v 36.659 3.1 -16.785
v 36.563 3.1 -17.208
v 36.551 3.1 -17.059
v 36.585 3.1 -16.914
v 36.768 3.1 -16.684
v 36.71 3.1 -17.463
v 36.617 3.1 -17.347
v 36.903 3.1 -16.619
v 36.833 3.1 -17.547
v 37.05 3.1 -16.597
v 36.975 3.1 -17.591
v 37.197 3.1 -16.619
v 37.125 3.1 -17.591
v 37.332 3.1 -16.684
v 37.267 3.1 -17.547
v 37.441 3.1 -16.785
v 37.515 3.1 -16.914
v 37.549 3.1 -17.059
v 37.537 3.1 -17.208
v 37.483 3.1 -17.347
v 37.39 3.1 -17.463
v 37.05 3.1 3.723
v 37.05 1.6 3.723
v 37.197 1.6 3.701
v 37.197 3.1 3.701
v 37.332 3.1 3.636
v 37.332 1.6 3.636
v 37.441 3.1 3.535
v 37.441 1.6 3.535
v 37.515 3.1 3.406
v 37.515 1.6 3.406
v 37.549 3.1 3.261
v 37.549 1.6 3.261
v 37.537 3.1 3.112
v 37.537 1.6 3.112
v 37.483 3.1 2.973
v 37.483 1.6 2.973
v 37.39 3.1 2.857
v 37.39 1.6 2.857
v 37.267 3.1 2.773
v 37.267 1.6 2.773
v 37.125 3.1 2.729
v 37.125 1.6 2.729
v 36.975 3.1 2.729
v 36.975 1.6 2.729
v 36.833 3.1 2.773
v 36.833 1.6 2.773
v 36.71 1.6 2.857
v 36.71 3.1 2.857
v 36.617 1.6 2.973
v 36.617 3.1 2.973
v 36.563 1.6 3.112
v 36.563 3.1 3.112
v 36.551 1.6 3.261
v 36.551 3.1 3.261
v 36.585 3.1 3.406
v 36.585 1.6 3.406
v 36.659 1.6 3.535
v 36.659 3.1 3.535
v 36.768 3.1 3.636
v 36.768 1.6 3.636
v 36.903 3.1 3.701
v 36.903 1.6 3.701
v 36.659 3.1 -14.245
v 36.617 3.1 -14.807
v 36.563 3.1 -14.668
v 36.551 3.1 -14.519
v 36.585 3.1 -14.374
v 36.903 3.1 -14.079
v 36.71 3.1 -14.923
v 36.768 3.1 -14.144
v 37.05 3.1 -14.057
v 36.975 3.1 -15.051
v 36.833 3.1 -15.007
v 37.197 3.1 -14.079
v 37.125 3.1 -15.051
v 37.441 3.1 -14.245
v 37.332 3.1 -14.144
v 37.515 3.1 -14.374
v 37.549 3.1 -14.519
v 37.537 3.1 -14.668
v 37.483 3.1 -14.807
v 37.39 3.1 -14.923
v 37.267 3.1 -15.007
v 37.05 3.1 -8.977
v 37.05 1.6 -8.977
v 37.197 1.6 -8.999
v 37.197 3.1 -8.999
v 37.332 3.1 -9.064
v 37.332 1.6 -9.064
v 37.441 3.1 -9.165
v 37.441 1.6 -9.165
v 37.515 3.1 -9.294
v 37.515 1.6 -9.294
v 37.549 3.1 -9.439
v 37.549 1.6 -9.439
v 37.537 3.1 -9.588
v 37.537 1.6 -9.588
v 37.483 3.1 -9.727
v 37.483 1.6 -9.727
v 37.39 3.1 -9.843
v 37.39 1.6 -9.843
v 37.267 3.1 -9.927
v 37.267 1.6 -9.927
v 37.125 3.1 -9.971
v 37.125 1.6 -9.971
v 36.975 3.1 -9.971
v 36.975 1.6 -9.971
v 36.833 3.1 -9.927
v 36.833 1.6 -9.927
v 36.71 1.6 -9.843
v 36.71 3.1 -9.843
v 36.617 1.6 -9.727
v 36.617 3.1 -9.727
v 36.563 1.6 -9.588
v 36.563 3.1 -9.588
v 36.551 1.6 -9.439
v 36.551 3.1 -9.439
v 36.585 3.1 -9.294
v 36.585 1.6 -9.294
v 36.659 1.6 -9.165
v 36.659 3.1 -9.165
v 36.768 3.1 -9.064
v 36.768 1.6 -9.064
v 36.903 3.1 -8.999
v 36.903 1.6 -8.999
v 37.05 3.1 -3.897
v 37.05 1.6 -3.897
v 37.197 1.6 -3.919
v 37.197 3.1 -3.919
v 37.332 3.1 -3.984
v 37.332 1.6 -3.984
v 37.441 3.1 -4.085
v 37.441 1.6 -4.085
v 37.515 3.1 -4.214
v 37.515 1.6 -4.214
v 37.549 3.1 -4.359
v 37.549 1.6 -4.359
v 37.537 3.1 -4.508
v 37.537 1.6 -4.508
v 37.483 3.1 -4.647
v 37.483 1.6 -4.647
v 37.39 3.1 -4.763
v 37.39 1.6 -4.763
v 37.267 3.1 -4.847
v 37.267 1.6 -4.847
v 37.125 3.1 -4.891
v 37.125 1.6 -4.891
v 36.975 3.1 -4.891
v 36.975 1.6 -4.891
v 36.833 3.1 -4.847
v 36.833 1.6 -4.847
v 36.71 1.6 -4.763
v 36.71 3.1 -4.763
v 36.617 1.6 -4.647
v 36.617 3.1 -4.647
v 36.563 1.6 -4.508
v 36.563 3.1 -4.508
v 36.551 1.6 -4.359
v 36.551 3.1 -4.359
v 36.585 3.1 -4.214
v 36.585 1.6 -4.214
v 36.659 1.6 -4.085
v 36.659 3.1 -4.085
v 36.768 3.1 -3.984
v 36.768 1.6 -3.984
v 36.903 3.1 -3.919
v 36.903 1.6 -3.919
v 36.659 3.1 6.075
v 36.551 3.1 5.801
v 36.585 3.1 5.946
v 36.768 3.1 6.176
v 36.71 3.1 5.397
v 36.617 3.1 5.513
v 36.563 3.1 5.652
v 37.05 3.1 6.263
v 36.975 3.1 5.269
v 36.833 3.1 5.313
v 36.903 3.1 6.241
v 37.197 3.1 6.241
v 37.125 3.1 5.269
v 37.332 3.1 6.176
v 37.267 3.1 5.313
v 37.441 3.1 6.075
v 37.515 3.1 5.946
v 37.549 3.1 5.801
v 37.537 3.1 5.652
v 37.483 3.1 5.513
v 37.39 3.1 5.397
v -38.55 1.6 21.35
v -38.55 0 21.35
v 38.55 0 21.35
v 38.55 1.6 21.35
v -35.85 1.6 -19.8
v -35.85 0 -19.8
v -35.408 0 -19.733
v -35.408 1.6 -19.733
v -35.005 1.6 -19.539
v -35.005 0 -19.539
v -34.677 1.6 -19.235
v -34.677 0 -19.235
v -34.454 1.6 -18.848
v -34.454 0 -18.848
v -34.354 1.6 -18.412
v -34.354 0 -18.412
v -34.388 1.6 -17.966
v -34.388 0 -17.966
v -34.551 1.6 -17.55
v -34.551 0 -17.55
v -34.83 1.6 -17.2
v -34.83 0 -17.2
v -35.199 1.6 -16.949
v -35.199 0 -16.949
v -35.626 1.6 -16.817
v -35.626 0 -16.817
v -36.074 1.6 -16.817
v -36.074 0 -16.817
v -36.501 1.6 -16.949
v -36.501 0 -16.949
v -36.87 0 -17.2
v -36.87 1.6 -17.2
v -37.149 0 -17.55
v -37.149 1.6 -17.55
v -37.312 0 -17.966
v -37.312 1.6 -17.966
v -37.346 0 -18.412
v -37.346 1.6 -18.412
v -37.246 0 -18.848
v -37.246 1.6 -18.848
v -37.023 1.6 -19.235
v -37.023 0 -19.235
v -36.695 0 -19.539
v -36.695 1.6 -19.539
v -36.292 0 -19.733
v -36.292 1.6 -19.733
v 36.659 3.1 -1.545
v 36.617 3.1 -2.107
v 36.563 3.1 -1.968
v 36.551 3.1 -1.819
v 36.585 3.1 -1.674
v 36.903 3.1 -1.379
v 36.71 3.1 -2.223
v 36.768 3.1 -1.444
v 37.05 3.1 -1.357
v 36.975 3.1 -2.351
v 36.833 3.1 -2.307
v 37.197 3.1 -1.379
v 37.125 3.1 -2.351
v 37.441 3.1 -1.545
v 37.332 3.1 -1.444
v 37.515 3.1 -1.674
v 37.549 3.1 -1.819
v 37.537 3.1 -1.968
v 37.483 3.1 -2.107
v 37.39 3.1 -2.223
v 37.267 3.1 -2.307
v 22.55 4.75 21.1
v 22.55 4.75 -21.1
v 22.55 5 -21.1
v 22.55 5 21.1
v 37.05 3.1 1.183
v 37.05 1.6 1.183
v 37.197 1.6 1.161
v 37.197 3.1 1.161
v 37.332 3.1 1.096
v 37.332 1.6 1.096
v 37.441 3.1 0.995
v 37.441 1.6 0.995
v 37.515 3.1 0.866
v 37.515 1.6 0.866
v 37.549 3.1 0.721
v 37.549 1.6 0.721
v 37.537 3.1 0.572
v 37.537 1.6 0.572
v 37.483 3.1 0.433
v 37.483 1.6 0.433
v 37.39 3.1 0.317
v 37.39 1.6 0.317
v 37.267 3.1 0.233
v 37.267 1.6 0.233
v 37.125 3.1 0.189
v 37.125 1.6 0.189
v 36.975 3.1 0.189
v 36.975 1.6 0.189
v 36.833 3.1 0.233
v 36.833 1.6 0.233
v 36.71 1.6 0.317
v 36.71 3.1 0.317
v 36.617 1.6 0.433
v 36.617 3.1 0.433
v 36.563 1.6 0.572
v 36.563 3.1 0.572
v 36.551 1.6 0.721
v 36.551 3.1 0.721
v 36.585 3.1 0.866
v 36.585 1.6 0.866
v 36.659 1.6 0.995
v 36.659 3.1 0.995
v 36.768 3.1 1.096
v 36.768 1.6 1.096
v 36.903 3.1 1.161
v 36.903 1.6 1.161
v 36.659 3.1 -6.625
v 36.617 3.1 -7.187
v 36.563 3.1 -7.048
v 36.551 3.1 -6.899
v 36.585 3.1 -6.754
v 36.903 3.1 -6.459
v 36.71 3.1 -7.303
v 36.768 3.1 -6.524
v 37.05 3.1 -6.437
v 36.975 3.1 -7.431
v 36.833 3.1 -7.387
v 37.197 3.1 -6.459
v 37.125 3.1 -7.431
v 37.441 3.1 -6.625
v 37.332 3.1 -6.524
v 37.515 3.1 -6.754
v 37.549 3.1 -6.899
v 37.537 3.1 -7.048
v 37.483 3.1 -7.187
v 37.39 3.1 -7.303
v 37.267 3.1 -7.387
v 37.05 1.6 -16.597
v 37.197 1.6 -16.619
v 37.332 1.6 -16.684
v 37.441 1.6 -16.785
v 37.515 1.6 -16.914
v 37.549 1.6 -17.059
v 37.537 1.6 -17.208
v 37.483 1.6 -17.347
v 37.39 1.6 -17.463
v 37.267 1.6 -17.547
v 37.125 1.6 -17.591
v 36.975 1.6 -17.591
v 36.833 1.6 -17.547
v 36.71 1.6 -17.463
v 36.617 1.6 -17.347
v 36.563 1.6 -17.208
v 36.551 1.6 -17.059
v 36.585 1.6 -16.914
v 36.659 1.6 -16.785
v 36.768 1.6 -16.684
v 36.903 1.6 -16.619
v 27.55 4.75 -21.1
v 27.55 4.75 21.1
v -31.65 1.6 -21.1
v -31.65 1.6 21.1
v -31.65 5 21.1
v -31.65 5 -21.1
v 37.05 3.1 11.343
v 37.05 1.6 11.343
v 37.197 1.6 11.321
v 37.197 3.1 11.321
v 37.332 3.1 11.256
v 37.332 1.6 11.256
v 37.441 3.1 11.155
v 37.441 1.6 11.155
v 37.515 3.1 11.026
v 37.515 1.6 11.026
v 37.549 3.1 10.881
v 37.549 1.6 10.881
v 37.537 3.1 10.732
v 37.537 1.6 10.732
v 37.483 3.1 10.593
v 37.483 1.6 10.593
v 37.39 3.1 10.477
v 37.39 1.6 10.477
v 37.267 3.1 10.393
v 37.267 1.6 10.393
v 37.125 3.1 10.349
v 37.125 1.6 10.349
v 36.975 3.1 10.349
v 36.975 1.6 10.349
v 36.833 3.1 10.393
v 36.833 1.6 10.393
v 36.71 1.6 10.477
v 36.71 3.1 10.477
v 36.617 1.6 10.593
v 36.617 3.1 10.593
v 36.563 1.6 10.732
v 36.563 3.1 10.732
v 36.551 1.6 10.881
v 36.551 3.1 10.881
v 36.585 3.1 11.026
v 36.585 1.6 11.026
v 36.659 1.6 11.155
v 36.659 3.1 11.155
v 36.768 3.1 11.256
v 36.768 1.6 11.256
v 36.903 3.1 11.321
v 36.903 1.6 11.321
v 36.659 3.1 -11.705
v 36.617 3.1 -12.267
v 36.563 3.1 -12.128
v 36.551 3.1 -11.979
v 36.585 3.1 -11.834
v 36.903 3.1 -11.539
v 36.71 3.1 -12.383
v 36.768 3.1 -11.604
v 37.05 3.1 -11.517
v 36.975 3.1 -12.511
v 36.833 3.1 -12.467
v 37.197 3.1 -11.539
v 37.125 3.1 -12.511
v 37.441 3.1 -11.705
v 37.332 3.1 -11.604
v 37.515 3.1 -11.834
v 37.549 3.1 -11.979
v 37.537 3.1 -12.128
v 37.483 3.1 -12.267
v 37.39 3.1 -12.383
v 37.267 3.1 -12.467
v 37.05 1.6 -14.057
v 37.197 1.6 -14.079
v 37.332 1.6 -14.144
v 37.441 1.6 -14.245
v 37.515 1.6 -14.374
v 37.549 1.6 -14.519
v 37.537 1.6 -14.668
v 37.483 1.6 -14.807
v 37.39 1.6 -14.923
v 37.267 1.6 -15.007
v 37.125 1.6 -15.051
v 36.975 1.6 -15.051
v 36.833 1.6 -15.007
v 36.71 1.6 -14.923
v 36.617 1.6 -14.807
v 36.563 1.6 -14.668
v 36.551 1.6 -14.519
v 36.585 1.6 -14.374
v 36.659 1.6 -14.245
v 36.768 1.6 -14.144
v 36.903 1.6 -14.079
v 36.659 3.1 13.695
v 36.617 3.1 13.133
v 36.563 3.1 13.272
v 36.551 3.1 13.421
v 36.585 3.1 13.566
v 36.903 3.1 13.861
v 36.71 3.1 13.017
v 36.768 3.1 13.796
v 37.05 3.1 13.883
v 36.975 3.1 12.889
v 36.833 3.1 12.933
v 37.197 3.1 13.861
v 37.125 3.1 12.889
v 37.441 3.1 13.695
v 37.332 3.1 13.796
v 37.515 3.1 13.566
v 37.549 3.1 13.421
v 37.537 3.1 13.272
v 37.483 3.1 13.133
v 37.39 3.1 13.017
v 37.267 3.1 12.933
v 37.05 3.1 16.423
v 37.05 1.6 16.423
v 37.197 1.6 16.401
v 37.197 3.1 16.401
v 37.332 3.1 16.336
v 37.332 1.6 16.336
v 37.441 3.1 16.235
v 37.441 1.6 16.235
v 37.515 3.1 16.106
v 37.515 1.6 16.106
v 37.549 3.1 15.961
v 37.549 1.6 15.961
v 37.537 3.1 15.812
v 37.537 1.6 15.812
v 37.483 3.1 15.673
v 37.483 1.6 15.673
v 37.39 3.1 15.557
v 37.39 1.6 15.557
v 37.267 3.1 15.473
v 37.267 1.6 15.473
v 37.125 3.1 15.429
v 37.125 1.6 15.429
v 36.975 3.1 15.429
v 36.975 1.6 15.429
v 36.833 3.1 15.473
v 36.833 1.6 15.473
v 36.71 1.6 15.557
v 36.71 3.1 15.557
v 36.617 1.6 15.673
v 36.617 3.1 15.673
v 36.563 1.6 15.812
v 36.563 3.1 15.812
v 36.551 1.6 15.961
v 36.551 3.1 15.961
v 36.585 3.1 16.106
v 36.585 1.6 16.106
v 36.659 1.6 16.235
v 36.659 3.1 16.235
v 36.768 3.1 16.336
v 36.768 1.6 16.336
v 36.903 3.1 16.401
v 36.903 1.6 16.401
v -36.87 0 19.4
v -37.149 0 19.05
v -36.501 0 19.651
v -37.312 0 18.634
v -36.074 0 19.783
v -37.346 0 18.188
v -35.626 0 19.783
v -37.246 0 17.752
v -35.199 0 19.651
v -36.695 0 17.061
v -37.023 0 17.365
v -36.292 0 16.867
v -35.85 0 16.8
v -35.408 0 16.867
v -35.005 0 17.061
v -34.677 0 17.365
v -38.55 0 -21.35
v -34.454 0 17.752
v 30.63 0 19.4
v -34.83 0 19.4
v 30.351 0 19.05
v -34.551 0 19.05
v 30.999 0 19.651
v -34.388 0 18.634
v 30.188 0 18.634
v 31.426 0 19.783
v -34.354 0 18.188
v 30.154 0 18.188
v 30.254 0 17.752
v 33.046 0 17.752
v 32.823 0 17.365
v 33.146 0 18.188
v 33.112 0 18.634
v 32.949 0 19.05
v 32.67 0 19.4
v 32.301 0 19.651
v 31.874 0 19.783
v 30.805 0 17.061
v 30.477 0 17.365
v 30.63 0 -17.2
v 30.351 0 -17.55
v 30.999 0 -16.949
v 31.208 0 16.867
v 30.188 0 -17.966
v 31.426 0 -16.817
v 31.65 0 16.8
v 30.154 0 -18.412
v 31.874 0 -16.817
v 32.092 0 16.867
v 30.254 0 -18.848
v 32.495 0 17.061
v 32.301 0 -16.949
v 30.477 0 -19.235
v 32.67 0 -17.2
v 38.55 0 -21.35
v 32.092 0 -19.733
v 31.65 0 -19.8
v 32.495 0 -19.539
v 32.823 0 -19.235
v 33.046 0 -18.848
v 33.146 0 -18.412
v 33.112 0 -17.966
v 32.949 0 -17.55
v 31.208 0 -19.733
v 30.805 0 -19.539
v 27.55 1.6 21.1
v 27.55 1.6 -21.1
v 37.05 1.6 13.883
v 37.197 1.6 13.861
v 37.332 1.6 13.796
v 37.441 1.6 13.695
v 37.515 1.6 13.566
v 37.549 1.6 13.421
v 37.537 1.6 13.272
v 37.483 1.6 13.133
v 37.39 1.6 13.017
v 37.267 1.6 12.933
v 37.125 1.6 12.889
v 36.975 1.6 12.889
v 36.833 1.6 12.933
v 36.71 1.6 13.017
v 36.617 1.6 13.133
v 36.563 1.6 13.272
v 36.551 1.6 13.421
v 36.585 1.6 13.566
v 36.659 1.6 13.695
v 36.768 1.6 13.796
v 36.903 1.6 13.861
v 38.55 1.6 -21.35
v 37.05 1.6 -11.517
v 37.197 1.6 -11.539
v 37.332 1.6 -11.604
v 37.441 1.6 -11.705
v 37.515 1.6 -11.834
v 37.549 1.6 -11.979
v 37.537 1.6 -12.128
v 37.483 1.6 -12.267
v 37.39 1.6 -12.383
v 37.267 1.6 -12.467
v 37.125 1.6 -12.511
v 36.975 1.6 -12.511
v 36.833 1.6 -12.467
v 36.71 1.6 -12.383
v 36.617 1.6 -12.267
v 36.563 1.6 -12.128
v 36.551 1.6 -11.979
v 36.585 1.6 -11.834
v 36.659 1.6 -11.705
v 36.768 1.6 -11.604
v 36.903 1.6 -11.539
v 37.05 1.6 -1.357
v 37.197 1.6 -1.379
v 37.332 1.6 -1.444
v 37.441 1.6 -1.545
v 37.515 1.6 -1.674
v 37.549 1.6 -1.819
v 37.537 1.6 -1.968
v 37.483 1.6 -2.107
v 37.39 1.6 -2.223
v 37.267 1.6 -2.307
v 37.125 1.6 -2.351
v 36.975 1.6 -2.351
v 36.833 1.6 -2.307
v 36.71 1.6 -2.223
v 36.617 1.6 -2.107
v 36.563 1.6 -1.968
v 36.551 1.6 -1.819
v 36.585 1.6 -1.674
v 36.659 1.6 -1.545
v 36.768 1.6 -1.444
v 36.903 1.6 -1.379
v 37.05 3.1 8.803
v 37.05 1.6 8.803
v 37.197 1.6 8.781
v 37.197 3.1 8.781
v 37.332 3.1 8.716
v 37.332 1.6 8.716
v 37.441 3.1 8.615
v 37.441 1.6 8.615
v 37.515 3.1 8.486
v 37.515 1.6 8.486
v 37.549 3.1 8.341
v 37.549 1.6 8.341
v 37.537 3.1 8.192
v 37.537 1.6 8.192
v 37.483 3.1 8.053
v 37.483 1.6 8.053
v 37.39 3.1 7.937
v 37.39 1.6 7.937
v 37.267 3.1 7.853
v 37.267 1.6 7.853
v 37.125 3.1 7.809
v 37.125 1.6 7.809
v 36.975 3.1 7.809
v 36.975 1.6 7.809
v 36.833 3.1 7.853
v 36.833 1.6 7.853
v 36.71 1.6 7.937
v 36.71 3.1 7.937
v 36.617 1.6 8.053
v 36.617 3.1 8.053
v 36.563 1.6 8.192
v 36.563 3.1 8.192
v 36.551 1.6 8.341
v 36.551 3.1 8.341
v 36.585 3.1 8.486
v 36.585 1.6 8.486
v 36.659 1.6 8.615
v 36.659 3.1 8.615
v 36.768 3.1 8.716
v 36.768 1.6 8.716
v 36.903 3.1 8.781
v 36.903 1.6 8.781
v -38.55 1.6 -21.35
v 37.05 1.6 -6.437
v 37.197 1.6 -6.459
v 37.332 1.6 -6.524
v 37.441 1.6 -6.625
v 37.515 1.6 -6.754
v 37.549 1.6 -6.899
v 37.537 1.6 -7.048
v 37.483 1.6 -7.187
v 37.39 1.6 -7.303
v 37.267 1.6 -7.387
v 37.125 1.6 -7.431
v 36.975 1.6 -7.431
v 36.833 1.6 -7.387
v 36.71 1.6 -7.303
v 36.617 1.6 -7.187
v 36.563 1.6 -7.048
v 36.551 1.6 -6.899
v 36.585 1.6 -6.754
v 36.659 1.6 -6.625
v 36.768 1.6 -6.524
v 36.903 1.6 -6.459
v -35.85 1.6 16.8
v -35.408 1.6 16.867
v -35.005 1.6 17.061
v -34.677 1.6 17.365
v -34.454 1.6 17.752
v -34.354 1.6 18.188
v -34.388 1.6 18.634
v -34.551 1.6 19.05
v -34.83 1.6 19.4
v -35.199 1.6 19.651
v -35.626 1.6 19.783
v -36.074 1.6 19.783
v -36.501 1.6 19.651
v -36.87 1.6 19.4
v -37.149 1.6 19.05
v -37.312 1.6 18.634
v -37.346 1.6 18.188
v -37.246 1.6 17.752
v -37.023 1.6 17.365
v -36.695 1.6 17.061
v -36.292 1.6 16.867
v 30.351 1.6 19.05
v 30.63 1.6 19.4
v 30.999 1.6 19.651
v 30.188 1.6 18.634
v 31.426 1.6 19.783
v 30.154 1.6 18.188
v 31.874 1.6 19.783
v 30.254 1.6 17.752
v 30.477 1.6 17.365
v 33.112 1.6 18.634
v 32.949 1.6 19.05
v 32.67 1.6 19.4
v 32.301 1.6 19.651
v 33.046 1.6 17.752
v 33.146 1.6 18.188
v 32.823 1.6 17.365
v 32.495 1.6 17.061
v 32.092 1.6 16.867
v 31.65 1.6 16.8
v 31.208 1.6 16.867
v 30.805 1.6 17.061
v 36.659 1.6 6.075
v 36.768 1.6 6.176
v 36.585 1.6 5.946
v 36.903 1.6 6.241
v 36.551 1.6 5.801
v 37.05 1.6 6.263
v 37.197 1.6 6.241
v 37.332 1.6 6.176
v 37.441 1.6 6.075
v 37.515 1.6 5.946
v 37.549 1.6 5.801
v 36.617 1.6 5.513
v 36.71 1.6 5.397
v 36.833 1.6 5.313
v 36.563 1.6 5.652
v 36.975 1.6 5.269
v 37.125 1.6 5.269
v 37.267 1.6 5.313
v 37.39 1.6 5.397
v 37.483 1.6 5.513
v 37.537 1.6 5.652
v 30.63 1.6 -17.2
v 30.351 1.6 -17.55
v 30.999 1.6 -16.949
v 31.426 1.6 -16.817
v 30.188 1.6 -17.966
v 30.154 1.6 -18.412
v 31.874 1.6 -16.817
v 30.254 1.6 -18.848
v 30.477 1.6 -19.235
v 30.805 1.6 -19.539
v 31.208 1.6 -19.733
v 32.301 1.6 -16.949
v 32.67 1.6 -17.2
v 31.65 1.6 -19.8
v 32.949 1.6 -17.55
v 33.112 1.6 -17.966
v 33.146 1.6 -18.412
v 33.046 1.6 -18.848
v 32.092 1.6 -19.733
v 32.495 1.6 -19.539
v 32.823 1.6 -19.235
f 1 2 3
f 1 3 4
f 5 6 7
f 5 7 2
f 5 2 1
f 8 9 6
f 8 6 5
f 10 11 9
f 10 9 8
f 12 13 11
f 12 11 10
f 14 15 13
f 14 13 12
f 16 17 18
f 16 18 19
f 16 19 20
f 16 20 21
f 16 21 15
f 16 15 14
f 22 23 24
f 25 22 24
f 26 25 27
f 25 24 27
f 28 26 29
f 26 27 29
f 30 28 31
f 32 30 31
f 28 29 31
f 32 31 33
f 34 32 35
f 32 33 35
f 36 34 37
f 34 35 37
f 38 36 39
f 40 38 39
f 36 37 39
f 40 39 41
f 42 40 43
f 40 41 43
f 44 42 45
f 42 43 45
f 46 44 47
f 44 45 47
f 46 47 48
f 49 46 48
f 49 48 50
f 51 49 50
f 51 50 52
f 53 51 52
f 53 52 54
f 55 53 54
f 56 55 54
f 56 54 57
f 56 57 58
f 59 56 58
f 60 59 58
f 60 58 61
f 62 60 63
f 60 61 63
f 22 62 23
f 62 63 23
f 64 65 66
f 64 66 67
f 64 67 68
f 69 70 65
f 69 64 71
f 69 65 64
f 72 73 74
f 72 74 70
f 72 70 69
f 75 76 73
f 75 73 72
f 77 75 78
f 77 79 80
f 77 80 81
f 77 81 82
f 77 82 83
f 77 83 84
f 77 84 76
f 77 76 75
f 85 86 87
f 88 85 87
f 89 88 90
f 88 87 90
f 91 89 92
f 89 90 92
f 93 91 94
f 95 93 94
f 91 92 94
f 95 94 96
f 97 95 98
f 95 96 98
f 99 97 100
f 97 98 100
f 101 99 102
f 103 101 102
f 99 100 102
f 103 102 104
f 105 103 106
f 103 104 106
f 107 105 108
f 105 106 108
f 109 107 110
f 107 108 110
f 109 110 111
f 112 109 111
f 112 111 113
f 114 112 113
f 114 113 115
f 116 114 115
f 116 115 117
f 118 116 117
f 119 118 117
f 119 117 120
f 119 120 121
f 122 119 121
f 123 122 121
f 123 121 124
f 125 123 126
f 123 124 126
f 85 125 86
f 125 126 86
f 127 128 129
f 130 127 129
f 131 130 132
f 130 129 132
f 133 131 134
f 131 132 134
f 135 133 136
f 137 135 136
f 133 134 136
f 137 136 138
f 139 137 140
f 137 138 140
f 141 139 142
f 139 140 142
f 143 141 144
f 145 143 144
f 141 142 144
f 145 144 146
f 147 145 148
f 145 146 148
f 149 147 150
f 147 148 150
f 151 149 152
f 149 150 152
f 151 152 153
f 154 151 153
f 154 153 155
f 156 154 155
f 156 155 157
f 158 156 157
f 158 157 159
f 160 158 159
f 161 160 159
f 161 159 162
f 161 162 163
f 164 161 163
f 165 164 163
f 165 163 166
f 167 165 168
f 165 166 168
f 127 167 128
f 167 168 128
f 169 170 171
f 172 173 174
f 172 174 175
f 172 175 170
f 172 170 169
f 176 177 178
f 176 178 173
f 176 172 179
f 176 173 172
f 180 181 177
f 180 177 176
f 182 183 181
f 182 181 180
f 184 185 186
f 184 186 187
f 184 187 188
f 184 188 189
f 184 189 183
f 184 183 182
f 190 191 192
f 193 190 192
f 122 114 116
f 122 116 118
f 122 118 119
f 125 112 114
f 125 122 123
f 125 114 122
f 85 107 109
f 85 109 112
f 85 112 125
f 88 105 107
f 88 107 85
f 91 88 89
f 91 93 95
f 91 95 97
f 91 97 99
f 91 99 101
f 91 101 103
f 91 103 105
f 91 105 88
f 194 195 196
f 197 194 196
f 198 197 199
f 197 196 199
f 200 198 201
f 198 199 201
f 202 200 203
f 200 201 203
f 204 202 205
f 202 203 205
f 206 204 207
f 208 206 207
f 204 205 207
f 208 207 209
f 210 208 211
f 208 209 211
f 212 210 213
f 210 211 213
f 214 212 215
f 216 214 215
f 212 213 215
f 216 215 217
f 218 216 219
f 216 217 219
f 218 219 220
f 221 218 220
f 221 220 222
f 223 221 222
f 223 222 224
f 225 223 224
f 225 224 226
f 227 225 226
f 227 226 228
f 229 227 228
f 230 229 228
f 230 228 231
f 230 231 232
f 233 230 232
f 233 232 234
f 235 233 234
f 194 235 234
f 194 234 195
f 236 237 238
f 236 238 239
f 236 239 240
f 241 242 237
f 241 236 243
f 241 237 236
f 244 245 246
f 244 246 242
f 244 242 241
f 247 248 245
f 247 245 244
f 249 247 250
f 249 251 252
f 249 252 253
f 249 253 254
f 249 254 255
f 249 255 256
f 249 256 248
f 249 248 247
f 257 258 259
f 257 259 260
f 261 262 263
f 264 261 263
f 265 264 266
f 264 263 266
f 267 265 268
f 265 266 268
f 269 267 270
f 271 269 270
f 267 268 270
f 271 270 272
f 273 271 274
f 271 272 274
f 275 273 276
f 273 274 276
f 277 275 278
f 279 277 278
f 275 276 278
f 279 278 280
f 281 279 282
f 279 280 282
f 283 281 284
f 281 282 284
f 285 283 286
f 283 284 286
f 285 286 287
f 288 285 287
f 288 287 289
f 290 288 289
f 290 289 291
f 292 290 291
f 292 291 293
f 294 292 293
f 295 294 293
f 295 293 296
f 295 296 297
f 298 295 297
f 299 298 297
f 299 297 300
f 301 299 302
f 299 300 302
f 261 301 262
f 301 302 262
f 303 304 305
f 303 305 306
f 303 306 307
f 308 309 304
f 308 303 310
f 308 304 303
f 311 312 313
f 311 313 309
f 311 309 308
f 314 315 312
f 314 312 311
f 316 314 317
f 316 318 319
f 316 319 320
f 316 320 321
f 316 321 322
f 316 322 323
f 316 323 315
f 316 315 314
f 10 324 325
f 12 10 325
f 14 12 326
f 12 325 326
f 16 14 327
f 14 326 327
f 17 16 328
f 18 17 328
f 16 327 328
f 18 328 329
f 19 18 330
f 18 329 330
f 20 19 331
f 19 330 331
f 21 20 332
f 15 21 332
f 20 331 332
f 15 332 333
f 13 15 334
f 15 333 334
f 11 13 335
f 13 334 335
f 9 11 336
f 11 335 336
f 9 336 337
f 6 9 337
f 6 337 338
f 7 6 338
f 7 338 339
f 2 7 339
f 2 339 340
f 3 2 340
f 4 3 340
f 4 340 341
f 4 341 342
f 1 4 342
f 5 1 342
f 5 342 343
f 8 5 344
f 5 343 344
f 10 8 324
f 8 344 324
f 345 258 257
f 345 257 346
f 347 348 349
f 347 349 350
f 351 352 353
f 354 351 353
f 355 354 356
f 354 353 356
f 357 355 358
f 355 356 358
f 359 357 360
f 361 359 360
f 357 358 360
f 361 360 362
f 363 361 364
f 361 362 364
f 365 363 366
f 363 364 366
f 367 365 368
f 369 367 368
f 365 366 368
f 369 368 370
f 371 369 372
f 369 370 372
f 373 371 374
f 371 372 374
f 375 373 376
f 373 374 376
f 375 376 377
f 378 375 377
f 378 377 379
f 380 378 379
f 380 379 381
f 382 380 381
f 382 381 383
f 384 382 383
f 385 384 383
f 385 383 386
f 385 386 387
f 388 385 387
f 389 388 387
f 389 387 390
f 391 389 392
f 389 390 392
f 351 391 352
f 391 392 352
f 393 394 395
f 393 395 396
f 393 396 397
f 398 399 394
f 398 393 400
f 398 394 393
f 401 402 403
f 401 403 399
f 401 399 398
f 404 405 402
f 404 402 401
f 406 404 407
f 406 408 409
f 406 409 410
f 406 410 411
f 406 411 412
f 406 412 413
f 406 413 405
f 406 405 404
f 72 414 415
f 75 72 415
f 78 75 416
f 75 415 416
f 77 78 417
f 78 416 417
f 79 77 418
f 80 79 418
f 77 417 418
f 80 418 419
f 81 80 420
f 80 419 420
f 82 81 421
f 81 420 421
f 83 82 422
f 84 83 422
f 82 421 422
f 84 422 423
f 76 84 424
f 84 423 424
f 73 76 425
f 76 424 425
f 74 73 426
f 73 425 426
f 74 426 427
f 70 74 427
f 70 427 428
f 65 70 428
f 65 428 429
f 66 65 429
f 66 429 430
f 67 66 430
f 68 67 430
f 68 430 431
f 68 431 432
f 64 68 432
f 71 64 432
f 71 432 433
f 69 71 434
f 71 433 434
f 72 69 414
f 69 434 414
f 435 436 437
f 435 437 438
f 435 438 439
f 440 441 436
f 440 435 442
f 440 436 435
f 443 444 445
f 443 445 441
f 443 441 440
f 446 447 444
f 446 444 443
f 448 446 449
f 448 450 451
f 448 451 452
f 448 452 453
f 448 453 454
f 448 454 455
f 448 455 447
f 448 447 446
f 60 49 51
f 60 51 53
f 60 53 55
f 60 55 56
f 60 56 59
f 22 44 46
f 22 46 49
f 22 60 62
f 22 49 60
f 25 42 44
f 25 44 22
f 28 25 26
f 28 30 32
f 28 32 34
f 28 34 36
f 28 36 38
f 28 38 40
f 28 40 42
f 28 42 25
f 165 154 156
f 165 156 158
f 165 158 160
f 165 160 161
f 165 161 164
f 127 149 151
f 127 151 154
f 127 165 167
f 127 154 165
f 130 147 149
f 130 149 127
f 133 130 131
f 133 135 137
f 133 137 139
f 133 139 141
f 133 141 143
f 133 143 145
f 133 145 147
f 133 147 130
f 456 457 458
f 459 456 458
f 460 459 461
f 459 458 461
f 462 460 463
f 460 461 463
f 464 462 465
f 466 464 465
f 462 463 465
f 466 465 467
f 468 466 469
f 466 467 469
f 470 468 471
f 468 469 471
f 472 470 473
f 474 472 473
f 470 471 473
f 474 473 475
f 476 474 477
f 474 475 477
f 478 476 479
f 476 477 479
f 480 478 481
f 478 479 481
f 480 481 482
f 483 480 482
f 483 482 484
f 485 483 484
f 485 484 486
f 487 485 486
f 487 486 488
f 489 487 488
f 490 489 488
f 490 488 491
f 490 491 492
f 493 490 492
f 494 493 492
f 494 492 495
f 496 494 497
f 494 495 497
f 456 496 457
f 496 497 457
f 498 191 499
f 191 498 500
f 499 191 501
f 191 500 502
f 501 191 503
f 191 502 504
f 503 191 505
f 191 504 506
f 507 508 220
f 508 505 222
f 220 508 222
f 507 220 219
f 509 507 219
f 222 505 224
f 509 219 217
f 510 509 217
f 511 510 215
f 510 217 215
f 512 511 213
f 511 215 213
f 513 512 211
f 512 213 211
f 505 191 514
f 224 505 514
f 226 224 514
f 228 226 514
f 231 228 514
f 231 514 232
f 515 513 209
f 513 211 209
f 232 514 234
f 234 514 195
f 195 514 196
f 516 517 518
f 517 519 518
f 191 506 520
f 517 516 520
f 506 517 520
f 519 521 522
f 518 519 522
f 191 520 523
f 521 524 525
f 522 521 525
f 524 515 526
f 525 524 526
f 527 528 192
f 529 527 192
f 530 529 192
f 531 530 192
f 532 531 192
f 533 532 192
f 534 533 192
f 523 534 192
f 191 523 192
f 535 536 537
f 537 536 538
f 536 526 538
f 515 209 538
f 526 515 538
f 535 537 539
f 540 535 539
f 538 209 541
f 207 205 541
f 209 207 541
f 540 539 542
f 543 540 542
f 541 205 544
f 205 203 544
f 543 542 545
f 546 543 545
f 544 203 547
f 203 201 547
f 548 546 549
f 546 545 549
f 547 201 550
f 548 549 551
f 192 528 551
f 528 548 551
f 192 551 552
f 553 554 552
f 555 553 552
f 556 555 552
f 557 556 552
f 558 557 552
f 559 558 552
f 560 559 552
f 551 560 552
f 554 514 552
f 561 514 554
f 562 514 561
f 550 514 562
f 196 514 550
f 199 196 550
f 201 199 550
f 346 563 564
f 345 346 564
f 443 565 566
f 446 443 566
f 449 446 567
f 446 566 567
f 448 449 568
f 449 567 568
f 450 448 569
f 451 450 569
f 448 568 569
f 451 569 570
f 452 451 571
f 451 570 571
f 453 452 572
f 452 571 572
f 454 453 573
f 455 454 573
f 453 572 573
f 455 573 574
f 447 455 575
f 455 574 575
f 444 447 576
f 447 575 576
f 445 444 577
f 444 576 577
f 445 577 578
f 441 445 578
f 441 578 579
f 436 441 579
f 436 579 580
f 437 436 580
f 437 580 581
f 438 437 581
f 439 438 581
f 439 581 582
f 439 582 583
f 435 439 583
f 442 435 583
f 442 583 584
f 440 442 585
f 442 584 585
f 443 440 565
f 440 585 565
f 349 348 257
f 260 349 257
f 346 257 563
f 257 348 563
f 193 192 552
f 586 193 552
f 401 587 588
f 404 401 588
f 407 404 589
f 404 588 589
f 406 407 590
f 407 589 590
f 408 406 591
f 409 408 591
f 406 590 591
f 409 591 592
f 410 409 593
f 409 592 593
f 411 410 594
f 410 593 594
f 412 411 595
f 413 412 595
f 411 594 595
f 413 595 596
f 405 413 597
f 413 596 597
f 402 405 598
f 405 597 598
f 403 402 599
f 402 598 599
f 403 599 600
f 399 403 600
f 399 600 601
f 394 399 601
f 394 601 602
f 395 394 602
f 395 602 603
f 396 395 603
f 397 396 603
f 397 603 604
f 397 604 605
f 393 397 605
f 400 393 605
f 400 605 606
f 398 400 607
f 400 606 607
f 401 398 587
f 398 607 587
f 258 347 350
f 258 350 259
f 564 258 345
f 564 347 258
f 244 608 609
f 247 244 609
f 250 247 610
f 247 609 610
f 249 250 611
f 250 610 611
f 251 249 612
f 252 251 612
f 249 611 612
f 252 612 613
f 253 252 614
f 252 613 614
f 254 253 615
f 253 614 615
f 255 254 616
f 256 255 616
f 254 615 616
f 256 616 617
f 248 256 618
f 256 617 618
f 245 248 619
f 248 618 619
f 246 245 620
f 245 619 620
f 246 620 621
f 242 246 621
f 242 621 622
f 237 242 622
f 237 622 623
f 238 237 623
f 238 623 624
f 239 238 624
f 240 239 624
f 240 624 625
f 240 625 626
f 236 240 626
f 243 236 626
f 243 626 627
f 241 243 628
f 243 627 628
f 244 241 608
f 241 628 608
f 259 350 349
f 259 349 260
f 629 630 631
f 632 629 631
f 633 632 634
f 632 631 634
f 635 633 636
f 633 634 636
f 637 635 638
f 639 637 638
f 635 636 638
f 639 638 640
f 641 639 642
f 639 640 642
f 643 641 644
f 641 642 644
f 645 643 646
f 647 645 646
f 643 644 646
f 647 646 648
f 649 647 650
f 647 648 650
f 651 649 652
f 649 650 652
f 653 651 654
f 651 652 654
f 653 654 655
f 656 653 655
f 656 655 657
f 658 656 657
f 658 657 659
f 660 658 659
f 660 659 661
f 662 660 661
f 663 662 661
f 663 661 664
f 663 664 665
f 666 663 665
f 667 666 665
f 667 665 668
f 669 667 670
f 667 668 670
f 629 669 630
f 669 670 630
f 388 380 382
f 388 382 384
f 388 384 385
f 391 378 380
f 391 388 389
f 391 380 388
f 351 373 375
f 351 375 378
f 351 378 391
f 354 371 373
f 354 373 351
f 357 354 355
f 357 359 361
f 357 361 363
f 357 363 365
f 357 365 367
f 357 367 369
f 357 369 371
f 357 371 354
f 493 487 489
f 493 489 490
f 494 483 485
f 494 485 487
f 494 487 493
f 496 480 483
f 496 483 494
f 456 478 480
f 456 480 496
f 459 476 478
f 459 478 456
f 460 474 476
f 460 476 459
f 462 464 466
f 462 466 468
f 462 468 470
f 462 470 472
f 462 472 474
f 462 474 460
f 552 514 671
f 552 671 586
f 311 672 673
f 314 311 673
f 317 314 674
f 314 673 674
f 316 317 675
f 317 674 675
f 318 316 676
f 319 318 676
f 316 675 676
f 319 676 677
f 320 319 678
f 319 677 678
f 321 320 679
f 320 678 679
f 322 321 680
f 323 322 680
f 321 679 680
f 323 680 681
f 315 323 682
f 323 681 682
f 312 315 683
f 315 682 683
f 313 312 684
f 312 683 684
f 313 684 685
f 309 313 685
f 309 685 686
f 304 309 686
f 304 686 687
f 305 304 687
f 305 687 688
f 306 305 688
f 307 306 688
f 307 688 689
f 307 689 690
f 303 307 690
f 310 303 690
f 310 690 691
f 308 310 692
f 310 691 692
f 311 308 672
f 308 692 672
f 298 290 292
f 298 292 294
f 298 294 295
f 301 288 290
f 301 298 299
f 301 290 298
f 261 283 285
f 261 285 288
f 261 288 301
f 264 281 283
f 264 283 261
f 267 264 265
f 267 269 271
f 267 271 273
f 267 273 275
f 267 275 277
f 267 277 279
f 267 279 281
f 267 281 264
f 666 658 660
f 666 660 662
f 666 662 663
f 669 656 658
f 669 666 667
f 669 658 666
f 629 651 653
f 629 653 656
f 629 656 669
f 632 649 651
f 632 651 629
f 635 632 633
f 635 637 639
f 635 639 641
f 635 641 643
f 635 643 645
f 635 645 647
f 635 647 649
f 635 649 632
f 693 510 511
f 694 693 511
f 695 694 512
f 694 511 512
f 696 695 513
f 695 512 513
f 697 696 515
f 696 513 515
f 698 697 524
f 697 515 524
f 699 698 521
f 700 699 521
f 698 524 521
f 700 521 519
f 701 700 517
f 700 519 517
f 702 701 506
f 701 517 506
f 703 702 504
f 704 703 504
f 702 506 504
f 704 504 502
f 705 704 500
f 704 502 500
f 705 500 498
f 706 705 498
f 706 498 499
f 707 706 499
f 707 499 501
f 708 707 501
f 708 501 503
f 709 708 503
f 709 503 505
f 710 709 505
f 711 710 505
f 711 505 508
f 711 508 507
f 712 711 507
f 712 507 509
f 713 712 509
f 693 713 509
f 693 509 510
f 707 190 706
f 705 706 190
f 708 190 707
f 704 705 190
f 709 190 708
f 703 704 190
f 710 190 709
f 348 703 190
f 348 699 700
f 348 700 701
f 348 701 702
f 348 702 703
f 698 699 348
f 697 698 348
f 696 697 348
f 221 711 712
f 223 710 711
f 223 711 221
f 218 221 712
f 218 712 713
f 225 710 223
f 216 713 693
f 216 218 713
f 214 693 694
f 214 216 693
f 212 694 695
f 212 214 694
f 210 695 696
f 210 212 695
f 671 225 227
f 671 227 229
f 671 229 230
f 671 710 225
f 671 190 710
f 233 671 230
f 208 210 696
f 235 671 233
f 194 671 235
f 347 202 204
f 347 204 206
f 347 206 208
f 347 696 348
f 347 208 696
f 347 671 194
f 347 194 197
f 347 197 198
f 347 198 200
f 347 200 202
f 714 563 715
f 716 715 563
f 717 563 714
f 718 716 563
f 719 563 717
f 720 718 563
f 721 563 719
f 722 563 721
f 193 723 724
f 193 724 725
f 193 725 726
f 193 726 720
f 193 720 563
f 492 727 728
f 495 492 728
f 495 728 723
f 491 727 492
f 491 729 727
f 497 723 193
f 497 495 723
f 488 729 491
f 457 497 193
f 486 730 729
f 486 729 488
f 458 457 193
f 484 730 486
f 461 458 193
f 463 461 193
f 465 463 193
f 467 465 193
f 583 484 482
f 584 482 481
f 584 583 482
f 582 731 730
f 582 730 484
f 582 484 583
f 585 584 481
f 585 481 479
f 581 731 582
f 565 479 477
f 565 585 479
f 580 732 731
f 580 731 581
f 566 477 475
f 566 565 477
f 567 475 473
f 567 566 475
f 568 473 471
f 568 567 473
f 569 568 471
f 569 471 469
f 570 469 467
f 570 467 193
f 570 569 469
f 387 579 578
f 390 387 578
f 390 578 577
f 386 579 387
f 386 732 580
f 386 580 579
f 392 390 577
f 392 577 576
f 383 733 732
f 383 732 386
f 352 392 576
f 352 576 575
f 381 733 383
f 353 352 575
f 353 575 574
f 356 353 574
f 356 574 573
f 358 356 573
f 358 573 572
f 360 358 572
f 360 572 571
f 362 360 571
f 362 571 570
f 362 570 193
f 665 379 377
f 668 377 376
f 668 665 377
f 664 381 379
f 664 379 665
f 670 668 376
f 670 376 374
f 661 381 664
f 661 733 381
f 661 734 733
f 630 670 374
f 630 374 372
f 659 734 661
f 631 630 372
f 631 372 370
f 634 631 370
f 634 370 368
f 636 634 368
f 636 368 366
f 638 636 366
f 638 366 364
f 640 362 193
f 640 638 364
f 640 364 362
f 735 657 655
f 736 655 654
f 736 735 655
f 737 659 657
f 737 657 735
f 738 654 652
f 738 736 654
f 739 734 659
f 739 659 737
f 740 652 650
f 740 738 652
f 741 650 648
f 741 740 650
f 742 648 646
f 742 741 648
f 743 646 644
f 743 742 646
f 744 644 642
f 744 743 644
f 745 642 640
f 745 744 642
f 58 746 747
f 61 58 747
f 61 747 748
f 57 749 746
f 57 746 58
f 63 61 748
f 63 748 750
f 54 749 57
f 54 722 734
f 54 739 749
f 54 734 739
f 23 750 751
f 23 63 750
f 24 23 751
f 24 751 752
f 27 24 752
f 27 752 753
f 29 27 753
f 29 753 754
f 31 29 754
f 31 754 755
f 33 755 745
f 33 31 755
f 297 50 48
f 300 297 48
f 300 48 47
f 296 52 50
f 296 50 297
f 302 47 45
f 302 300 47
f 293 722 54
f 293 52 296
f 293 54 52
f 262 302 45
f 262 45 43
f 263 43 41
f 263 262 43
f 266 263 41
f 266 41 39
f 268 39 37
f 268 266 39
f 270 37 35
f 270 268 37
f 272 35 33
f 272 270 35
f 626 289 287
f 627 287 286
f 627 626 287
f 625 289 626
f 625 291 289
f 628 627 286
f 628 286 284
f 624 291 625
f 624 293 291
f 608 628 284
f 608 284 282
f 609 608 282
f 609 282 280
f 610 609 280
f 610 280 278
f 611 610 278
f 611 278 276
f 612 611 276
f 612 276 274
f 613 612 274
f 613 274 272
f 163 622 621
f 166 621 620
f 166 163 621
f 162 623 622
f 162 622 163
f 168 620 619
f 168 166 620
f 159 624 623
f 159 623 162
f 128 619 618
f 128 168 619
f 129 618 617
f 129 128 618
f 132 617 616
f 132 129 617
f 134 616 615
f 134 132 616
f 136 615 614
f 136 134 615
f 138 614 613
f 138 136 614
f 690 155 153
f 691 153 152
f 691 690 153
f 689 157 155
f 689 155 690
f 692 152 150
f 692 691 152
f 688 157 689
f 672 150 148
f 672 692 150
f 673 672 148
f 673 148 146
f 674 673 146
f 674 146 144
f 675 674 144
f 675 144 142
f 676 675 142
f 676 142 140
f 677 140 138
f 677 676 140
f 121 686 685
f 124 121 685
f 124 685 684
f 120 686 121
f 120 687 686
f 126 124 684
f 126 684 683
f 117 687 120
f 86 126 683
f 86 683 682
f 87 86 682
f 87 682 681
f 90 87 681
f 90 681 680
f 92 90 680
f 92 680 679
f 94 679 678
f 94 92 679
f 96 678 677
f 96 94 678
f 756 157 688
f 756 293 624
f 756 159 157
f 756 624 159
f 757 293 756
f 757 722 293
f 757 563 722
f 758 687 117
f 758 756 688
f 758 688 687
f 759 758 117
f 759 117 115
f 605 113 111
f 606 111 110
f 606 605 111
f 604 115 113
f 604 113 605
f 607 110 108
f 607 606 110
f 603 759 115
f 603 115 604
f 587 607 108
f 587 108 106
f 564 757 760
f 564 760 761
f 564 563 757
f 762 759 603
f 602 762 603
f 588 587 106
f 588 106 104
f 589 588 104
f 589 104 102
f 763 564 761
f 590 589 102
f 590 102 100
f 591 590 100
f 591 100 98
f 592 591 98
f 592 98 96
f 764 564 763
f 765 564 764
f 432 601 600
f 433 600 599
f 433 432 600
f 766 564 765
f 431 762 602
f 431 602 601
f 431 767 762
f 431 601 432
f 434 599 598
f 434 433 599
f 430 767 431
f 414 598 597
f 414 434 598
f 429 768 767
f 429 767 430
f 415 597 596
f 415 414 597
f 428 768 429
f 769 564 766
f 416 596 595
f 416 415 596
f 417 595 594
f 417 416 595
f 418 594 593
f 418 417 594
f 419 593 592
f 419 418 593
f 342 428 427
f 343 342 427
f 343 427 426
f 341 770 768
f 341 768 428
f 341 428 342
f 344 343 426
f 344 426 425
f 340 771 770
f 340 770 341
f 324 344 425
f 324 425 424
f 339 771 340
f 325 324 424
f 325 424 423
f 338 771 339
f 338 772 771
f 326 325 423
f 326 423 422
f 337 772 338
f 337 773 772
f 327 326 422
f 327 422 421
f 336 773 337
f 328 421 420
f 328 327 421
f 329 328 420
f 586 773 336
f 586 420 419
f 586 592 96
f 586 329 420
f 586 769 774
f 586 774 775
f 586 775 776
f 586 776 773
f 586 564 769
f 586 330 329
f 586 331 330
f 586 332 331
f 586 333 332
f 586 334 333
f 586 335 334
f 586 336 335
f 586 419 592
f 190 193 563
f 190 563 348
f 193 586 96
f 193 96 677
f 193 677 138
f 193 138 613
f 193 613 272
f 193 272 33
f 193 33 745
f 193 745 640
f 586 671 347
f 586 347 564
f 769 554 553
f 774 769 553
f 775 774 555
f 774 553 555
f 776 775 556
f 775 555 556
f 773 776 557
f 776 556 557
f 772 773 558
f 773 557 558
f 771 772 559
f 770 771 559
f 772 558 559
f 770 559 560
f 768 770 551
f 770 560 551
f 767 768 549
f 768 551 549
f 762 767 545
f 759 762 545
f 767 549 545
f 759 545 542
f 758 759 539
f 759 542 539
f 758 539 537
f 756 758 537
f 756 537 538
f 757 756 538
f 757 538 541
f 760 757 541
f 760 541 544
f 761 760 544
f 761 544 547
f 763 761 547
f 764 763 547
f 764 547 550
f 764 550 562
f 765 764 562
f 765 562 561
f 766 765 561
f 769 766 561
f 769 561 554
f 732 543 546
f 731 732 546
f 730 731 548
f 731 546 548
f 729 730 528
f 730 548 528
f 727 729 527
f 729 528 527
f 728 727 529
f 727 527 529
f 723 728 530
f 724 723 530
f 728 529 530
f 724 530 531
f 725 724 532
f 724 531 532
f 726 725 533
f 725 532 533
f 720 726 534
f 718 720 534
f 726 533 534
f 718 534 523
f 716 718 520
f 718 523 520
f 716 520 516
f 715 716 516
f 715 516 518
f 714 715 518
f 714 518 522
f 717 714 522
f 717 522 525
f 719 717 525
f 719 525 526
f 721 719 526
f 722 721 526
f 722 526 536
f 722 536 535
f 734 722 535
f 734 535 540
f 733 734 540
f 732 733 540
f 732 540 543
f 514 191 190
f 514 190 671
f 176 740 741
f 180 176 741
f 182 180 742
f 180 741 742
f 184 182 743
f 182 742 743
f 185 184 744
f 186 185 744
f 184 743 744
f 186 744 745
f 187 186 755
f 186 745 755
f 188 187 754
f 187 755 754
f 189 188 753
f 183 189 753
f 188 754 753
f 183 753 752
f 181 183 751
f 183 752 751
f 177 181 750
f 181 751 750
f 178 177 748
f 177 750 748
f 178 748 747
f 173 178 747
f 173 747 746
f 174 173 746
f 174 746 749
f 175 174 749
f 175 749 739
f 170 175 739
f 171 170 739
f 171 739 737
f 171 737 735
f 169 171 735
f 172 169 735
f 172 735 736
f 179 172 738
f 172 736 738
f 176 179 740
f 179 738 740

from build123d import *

# Parameters (mm, degrees)
CROQUIS1_W              = 77.1
CROQUIS1_H              = 42.7
SALIENTE_EXTRUIR1_DEPTH = 1.6
CROQUIS2_W              = 59.2
CROQUIS2_H              = 42.2
SALIENTE_EXTRUIR2_DEPTH = 3.4
CORTAR_EXTRUIR2_REACH   = 46.35
CROQUIS4_R              = 1.5
CUT_EXTRUDE1_DEPTH      = 45.350028185
CUT_EXTRUDE1_DEPTH_BACK = 0.25
CROQUIS3_R              = 0.5
BOSS_EXTRUDE1_DEPTH     = 1.5


with BuildPart() as part:
    # Croquis1 → Saliente-Extruir1 (new body)
    with BuildSketch(Plane(origin=(0, 0, 0), x_dir=(1, 0, 0), z_dir=(0, 1, 0))):
        Rectangle(CROQUIS1_W, CROQUIS1_H)
    extrude(amount=SALIENTE_EXTRUIR1_DEPTH)

    # Croquis2 → Saliente-Extruir2 (add)
    with BuildSketch(Plane(origin=(0, 1.6, 0), x_dir=(1, 0, 0), z_dir=(0, 1, 0))):
        with Locations((-2.05, 0)):
            Rectangle(CROQUIS2_W, CROQUIS2_H)
    extrude(amount=SALIENTE_EXTRUIR2_DEPTH)

    # Croquis4 → Cortar-Extruir2 (cut, up to next)
    with BuildSketch(Plane.XZ, mode=Mode.PRIVATE) as cortar_extruir2_sk1:
        with Locations(Location((-35.85, 18.3, 0), (0, 0, 270))):
            Circle(CROQUIS4_R)
    cortar_extruir2_tool1 = extrude(cortar_extruir2_sk1.sketch, amount=-CORTAR_EXTRUIR2_REACH, mode=Mode.PRIVATE) & part.part
    # Croquis4 → Cortar-Extruir2 (cut, up to next)
    with BuildSketch(Plane.XZ, mode=Mode.PRIVATE) as cortar_extruir2_sk2:
        with Locations(Location((31.65, 18.3, 0), (0, 0, 270))):
            Circle(CROQUIS4_R)
    cortar_extruir2_tool2 = extrude(cortar_extruir2_sk2.sketch, amount=-CORTAR_EXTRUIR2_REACH, mode=Mode.PRIVATE) & part.part
    # Croquis4 → Cortar-Extruir2 (cut, up to next)
    with BuildSketch(Plane.XZ, mode=Mode.PRIVATE) as cortar_extruir2_sk3:
        with Locations(Location((31.65, -18.3, 0), (0, 0, 270))):
            Circle(CROQUIS4_R)
    cortar_extruir2_tool3 = extrude(cortar_extruir2_sk3.sketch, amount=-CORTAR_EXTRUIR2_REACH, mode=Mode.PRIVATE) & part.part
    # Croquis4 → Cortar-Extruir2 (cut, up to next)
    with BuildSketch(Plane.XZ, mode=Mode.PRIVATE) as cortar_extruir2_sk4:
        with Locations(Location((-35.85, -18.3, 0), (0, 0, 270))):
            Circle(CROQUIS4_R)
    cortar_extruir2_tool4 = extrude(cortar_extruir2_sk4.sketch, amount=-CORTAR_EXTRUIR2_REACH, mode=Mode.PRIVATE) & part.part
    add(cortar_extruir2_tool1.solids().sort_by_distance((-35.85, 0, 18.3))[0], mode=Mode.SUBTRACT)
    add(cortar_extruir2_tool2.solids().sort_by_distance((31.65, 0, 18.3))[0], mode=Mode.SUBTRACT)
    add(cortar_extruir2_tool3.solids().sort_by_distance((31.65, 0, -18.3))[0], mode=Mode.SUBTRACT)
    add(cortar_extruir2_tool4.solids().sort_by_distance((-35.85, 0, -18.3))[0], mode=Mode.SUBTRACT)

    # Sketch3 → Cut-Extrude1 (cut, two sides: drawn at the far end of the back side and taken through both)
    with BuildSketch(Plane(origin=(0, 5, 0), x_dir=(1, 0, 0), z_dir=(0, 1, 0)).offset(-CUT_EXTRUDE1_DEPTH_BACK)):
        Polygon((22.55, 179.899832697), (22.55, 21.10051324), (22.55, -21.101140947), (22.55, -179.900460404), (340.148638914, -179.900460404), (340.148638914, 179.899832697), align=None)
    extrude(amount=CUT_EXTRUDE1_DEPTH + CUT_EXTRUDE1_DEPTH_BACK, mode=Mode.SUBTRACT)

    # Croquis3 → Boss-Extrude1 (add)
    with BuildSketch(Plane(origin=(0, 1.6, 0), x_dir=(1, 0, 0), z_dir=(0, 1, 0))):
        with Locations(Location((37.05, -15.923235508, 0), (0, 0, 270))):
            Circle(CROQUIS3_R)
        with Locations(Location((37.05, -13.383235508, 0), (0, 0, 270))):
            Circle(CROQUIS3_R)
        with Locations(Location((37.05, -10.843235508, 0), (0, 0, 270))):
            Circle(CROQUIS3_R)
        with Locations(Location((37.05, -8.303235508, 0), (0, 0, 270))):
            Circle(CROQUIS3_R)
        with Locations(Location((37.05, -5.763235508, 0), (0, 0, 270))):
            Circle(CROQUIS3_R)
        with Locations(Location((37.05, -3.223235508, 0), (0, 0, 270))):
            Circle(CROQUIS3_R)
        with Locations(Location((37.05, -0.683235508, 0), (0, 0, 270))):
            Circle(CROQUIS3_R)
        with Locations(Location((37.05, 1.856764492, 0), (0, 0, 270))):
            Circle(CROQUIS3_R)
        with Locations(Location((37.05, 4.396764492, 0), (0, 0, 270))):
            Circle(CROQUIS3_R)
        with Locations(Location((37.05, 6.936764492, 0), (0, 0, 270))):
            Circle(CROQUIS3_R)
        with Locations(Location((37.05, 9.476764492, 0), (0, 0, 270))):
            Circle(CROQUIS3_R)
        with Locations(Location((37.05, 12.016764492, 0), (0, 0, 270))):
            Circle(CROQUIS3_R)
        with Locations(Location((37.05, 14.556764492, 0), (0, 0, 270))):
            Circle(CROQUIS3_R)
        with Locations(Location((37.05, 17.096764492, 0), (0, 0, 270))):
            Circle(CROQUIS3_R)
    extrude(amount=BOSS_EXTRUDE1_DEPTH)


solid = part.part
